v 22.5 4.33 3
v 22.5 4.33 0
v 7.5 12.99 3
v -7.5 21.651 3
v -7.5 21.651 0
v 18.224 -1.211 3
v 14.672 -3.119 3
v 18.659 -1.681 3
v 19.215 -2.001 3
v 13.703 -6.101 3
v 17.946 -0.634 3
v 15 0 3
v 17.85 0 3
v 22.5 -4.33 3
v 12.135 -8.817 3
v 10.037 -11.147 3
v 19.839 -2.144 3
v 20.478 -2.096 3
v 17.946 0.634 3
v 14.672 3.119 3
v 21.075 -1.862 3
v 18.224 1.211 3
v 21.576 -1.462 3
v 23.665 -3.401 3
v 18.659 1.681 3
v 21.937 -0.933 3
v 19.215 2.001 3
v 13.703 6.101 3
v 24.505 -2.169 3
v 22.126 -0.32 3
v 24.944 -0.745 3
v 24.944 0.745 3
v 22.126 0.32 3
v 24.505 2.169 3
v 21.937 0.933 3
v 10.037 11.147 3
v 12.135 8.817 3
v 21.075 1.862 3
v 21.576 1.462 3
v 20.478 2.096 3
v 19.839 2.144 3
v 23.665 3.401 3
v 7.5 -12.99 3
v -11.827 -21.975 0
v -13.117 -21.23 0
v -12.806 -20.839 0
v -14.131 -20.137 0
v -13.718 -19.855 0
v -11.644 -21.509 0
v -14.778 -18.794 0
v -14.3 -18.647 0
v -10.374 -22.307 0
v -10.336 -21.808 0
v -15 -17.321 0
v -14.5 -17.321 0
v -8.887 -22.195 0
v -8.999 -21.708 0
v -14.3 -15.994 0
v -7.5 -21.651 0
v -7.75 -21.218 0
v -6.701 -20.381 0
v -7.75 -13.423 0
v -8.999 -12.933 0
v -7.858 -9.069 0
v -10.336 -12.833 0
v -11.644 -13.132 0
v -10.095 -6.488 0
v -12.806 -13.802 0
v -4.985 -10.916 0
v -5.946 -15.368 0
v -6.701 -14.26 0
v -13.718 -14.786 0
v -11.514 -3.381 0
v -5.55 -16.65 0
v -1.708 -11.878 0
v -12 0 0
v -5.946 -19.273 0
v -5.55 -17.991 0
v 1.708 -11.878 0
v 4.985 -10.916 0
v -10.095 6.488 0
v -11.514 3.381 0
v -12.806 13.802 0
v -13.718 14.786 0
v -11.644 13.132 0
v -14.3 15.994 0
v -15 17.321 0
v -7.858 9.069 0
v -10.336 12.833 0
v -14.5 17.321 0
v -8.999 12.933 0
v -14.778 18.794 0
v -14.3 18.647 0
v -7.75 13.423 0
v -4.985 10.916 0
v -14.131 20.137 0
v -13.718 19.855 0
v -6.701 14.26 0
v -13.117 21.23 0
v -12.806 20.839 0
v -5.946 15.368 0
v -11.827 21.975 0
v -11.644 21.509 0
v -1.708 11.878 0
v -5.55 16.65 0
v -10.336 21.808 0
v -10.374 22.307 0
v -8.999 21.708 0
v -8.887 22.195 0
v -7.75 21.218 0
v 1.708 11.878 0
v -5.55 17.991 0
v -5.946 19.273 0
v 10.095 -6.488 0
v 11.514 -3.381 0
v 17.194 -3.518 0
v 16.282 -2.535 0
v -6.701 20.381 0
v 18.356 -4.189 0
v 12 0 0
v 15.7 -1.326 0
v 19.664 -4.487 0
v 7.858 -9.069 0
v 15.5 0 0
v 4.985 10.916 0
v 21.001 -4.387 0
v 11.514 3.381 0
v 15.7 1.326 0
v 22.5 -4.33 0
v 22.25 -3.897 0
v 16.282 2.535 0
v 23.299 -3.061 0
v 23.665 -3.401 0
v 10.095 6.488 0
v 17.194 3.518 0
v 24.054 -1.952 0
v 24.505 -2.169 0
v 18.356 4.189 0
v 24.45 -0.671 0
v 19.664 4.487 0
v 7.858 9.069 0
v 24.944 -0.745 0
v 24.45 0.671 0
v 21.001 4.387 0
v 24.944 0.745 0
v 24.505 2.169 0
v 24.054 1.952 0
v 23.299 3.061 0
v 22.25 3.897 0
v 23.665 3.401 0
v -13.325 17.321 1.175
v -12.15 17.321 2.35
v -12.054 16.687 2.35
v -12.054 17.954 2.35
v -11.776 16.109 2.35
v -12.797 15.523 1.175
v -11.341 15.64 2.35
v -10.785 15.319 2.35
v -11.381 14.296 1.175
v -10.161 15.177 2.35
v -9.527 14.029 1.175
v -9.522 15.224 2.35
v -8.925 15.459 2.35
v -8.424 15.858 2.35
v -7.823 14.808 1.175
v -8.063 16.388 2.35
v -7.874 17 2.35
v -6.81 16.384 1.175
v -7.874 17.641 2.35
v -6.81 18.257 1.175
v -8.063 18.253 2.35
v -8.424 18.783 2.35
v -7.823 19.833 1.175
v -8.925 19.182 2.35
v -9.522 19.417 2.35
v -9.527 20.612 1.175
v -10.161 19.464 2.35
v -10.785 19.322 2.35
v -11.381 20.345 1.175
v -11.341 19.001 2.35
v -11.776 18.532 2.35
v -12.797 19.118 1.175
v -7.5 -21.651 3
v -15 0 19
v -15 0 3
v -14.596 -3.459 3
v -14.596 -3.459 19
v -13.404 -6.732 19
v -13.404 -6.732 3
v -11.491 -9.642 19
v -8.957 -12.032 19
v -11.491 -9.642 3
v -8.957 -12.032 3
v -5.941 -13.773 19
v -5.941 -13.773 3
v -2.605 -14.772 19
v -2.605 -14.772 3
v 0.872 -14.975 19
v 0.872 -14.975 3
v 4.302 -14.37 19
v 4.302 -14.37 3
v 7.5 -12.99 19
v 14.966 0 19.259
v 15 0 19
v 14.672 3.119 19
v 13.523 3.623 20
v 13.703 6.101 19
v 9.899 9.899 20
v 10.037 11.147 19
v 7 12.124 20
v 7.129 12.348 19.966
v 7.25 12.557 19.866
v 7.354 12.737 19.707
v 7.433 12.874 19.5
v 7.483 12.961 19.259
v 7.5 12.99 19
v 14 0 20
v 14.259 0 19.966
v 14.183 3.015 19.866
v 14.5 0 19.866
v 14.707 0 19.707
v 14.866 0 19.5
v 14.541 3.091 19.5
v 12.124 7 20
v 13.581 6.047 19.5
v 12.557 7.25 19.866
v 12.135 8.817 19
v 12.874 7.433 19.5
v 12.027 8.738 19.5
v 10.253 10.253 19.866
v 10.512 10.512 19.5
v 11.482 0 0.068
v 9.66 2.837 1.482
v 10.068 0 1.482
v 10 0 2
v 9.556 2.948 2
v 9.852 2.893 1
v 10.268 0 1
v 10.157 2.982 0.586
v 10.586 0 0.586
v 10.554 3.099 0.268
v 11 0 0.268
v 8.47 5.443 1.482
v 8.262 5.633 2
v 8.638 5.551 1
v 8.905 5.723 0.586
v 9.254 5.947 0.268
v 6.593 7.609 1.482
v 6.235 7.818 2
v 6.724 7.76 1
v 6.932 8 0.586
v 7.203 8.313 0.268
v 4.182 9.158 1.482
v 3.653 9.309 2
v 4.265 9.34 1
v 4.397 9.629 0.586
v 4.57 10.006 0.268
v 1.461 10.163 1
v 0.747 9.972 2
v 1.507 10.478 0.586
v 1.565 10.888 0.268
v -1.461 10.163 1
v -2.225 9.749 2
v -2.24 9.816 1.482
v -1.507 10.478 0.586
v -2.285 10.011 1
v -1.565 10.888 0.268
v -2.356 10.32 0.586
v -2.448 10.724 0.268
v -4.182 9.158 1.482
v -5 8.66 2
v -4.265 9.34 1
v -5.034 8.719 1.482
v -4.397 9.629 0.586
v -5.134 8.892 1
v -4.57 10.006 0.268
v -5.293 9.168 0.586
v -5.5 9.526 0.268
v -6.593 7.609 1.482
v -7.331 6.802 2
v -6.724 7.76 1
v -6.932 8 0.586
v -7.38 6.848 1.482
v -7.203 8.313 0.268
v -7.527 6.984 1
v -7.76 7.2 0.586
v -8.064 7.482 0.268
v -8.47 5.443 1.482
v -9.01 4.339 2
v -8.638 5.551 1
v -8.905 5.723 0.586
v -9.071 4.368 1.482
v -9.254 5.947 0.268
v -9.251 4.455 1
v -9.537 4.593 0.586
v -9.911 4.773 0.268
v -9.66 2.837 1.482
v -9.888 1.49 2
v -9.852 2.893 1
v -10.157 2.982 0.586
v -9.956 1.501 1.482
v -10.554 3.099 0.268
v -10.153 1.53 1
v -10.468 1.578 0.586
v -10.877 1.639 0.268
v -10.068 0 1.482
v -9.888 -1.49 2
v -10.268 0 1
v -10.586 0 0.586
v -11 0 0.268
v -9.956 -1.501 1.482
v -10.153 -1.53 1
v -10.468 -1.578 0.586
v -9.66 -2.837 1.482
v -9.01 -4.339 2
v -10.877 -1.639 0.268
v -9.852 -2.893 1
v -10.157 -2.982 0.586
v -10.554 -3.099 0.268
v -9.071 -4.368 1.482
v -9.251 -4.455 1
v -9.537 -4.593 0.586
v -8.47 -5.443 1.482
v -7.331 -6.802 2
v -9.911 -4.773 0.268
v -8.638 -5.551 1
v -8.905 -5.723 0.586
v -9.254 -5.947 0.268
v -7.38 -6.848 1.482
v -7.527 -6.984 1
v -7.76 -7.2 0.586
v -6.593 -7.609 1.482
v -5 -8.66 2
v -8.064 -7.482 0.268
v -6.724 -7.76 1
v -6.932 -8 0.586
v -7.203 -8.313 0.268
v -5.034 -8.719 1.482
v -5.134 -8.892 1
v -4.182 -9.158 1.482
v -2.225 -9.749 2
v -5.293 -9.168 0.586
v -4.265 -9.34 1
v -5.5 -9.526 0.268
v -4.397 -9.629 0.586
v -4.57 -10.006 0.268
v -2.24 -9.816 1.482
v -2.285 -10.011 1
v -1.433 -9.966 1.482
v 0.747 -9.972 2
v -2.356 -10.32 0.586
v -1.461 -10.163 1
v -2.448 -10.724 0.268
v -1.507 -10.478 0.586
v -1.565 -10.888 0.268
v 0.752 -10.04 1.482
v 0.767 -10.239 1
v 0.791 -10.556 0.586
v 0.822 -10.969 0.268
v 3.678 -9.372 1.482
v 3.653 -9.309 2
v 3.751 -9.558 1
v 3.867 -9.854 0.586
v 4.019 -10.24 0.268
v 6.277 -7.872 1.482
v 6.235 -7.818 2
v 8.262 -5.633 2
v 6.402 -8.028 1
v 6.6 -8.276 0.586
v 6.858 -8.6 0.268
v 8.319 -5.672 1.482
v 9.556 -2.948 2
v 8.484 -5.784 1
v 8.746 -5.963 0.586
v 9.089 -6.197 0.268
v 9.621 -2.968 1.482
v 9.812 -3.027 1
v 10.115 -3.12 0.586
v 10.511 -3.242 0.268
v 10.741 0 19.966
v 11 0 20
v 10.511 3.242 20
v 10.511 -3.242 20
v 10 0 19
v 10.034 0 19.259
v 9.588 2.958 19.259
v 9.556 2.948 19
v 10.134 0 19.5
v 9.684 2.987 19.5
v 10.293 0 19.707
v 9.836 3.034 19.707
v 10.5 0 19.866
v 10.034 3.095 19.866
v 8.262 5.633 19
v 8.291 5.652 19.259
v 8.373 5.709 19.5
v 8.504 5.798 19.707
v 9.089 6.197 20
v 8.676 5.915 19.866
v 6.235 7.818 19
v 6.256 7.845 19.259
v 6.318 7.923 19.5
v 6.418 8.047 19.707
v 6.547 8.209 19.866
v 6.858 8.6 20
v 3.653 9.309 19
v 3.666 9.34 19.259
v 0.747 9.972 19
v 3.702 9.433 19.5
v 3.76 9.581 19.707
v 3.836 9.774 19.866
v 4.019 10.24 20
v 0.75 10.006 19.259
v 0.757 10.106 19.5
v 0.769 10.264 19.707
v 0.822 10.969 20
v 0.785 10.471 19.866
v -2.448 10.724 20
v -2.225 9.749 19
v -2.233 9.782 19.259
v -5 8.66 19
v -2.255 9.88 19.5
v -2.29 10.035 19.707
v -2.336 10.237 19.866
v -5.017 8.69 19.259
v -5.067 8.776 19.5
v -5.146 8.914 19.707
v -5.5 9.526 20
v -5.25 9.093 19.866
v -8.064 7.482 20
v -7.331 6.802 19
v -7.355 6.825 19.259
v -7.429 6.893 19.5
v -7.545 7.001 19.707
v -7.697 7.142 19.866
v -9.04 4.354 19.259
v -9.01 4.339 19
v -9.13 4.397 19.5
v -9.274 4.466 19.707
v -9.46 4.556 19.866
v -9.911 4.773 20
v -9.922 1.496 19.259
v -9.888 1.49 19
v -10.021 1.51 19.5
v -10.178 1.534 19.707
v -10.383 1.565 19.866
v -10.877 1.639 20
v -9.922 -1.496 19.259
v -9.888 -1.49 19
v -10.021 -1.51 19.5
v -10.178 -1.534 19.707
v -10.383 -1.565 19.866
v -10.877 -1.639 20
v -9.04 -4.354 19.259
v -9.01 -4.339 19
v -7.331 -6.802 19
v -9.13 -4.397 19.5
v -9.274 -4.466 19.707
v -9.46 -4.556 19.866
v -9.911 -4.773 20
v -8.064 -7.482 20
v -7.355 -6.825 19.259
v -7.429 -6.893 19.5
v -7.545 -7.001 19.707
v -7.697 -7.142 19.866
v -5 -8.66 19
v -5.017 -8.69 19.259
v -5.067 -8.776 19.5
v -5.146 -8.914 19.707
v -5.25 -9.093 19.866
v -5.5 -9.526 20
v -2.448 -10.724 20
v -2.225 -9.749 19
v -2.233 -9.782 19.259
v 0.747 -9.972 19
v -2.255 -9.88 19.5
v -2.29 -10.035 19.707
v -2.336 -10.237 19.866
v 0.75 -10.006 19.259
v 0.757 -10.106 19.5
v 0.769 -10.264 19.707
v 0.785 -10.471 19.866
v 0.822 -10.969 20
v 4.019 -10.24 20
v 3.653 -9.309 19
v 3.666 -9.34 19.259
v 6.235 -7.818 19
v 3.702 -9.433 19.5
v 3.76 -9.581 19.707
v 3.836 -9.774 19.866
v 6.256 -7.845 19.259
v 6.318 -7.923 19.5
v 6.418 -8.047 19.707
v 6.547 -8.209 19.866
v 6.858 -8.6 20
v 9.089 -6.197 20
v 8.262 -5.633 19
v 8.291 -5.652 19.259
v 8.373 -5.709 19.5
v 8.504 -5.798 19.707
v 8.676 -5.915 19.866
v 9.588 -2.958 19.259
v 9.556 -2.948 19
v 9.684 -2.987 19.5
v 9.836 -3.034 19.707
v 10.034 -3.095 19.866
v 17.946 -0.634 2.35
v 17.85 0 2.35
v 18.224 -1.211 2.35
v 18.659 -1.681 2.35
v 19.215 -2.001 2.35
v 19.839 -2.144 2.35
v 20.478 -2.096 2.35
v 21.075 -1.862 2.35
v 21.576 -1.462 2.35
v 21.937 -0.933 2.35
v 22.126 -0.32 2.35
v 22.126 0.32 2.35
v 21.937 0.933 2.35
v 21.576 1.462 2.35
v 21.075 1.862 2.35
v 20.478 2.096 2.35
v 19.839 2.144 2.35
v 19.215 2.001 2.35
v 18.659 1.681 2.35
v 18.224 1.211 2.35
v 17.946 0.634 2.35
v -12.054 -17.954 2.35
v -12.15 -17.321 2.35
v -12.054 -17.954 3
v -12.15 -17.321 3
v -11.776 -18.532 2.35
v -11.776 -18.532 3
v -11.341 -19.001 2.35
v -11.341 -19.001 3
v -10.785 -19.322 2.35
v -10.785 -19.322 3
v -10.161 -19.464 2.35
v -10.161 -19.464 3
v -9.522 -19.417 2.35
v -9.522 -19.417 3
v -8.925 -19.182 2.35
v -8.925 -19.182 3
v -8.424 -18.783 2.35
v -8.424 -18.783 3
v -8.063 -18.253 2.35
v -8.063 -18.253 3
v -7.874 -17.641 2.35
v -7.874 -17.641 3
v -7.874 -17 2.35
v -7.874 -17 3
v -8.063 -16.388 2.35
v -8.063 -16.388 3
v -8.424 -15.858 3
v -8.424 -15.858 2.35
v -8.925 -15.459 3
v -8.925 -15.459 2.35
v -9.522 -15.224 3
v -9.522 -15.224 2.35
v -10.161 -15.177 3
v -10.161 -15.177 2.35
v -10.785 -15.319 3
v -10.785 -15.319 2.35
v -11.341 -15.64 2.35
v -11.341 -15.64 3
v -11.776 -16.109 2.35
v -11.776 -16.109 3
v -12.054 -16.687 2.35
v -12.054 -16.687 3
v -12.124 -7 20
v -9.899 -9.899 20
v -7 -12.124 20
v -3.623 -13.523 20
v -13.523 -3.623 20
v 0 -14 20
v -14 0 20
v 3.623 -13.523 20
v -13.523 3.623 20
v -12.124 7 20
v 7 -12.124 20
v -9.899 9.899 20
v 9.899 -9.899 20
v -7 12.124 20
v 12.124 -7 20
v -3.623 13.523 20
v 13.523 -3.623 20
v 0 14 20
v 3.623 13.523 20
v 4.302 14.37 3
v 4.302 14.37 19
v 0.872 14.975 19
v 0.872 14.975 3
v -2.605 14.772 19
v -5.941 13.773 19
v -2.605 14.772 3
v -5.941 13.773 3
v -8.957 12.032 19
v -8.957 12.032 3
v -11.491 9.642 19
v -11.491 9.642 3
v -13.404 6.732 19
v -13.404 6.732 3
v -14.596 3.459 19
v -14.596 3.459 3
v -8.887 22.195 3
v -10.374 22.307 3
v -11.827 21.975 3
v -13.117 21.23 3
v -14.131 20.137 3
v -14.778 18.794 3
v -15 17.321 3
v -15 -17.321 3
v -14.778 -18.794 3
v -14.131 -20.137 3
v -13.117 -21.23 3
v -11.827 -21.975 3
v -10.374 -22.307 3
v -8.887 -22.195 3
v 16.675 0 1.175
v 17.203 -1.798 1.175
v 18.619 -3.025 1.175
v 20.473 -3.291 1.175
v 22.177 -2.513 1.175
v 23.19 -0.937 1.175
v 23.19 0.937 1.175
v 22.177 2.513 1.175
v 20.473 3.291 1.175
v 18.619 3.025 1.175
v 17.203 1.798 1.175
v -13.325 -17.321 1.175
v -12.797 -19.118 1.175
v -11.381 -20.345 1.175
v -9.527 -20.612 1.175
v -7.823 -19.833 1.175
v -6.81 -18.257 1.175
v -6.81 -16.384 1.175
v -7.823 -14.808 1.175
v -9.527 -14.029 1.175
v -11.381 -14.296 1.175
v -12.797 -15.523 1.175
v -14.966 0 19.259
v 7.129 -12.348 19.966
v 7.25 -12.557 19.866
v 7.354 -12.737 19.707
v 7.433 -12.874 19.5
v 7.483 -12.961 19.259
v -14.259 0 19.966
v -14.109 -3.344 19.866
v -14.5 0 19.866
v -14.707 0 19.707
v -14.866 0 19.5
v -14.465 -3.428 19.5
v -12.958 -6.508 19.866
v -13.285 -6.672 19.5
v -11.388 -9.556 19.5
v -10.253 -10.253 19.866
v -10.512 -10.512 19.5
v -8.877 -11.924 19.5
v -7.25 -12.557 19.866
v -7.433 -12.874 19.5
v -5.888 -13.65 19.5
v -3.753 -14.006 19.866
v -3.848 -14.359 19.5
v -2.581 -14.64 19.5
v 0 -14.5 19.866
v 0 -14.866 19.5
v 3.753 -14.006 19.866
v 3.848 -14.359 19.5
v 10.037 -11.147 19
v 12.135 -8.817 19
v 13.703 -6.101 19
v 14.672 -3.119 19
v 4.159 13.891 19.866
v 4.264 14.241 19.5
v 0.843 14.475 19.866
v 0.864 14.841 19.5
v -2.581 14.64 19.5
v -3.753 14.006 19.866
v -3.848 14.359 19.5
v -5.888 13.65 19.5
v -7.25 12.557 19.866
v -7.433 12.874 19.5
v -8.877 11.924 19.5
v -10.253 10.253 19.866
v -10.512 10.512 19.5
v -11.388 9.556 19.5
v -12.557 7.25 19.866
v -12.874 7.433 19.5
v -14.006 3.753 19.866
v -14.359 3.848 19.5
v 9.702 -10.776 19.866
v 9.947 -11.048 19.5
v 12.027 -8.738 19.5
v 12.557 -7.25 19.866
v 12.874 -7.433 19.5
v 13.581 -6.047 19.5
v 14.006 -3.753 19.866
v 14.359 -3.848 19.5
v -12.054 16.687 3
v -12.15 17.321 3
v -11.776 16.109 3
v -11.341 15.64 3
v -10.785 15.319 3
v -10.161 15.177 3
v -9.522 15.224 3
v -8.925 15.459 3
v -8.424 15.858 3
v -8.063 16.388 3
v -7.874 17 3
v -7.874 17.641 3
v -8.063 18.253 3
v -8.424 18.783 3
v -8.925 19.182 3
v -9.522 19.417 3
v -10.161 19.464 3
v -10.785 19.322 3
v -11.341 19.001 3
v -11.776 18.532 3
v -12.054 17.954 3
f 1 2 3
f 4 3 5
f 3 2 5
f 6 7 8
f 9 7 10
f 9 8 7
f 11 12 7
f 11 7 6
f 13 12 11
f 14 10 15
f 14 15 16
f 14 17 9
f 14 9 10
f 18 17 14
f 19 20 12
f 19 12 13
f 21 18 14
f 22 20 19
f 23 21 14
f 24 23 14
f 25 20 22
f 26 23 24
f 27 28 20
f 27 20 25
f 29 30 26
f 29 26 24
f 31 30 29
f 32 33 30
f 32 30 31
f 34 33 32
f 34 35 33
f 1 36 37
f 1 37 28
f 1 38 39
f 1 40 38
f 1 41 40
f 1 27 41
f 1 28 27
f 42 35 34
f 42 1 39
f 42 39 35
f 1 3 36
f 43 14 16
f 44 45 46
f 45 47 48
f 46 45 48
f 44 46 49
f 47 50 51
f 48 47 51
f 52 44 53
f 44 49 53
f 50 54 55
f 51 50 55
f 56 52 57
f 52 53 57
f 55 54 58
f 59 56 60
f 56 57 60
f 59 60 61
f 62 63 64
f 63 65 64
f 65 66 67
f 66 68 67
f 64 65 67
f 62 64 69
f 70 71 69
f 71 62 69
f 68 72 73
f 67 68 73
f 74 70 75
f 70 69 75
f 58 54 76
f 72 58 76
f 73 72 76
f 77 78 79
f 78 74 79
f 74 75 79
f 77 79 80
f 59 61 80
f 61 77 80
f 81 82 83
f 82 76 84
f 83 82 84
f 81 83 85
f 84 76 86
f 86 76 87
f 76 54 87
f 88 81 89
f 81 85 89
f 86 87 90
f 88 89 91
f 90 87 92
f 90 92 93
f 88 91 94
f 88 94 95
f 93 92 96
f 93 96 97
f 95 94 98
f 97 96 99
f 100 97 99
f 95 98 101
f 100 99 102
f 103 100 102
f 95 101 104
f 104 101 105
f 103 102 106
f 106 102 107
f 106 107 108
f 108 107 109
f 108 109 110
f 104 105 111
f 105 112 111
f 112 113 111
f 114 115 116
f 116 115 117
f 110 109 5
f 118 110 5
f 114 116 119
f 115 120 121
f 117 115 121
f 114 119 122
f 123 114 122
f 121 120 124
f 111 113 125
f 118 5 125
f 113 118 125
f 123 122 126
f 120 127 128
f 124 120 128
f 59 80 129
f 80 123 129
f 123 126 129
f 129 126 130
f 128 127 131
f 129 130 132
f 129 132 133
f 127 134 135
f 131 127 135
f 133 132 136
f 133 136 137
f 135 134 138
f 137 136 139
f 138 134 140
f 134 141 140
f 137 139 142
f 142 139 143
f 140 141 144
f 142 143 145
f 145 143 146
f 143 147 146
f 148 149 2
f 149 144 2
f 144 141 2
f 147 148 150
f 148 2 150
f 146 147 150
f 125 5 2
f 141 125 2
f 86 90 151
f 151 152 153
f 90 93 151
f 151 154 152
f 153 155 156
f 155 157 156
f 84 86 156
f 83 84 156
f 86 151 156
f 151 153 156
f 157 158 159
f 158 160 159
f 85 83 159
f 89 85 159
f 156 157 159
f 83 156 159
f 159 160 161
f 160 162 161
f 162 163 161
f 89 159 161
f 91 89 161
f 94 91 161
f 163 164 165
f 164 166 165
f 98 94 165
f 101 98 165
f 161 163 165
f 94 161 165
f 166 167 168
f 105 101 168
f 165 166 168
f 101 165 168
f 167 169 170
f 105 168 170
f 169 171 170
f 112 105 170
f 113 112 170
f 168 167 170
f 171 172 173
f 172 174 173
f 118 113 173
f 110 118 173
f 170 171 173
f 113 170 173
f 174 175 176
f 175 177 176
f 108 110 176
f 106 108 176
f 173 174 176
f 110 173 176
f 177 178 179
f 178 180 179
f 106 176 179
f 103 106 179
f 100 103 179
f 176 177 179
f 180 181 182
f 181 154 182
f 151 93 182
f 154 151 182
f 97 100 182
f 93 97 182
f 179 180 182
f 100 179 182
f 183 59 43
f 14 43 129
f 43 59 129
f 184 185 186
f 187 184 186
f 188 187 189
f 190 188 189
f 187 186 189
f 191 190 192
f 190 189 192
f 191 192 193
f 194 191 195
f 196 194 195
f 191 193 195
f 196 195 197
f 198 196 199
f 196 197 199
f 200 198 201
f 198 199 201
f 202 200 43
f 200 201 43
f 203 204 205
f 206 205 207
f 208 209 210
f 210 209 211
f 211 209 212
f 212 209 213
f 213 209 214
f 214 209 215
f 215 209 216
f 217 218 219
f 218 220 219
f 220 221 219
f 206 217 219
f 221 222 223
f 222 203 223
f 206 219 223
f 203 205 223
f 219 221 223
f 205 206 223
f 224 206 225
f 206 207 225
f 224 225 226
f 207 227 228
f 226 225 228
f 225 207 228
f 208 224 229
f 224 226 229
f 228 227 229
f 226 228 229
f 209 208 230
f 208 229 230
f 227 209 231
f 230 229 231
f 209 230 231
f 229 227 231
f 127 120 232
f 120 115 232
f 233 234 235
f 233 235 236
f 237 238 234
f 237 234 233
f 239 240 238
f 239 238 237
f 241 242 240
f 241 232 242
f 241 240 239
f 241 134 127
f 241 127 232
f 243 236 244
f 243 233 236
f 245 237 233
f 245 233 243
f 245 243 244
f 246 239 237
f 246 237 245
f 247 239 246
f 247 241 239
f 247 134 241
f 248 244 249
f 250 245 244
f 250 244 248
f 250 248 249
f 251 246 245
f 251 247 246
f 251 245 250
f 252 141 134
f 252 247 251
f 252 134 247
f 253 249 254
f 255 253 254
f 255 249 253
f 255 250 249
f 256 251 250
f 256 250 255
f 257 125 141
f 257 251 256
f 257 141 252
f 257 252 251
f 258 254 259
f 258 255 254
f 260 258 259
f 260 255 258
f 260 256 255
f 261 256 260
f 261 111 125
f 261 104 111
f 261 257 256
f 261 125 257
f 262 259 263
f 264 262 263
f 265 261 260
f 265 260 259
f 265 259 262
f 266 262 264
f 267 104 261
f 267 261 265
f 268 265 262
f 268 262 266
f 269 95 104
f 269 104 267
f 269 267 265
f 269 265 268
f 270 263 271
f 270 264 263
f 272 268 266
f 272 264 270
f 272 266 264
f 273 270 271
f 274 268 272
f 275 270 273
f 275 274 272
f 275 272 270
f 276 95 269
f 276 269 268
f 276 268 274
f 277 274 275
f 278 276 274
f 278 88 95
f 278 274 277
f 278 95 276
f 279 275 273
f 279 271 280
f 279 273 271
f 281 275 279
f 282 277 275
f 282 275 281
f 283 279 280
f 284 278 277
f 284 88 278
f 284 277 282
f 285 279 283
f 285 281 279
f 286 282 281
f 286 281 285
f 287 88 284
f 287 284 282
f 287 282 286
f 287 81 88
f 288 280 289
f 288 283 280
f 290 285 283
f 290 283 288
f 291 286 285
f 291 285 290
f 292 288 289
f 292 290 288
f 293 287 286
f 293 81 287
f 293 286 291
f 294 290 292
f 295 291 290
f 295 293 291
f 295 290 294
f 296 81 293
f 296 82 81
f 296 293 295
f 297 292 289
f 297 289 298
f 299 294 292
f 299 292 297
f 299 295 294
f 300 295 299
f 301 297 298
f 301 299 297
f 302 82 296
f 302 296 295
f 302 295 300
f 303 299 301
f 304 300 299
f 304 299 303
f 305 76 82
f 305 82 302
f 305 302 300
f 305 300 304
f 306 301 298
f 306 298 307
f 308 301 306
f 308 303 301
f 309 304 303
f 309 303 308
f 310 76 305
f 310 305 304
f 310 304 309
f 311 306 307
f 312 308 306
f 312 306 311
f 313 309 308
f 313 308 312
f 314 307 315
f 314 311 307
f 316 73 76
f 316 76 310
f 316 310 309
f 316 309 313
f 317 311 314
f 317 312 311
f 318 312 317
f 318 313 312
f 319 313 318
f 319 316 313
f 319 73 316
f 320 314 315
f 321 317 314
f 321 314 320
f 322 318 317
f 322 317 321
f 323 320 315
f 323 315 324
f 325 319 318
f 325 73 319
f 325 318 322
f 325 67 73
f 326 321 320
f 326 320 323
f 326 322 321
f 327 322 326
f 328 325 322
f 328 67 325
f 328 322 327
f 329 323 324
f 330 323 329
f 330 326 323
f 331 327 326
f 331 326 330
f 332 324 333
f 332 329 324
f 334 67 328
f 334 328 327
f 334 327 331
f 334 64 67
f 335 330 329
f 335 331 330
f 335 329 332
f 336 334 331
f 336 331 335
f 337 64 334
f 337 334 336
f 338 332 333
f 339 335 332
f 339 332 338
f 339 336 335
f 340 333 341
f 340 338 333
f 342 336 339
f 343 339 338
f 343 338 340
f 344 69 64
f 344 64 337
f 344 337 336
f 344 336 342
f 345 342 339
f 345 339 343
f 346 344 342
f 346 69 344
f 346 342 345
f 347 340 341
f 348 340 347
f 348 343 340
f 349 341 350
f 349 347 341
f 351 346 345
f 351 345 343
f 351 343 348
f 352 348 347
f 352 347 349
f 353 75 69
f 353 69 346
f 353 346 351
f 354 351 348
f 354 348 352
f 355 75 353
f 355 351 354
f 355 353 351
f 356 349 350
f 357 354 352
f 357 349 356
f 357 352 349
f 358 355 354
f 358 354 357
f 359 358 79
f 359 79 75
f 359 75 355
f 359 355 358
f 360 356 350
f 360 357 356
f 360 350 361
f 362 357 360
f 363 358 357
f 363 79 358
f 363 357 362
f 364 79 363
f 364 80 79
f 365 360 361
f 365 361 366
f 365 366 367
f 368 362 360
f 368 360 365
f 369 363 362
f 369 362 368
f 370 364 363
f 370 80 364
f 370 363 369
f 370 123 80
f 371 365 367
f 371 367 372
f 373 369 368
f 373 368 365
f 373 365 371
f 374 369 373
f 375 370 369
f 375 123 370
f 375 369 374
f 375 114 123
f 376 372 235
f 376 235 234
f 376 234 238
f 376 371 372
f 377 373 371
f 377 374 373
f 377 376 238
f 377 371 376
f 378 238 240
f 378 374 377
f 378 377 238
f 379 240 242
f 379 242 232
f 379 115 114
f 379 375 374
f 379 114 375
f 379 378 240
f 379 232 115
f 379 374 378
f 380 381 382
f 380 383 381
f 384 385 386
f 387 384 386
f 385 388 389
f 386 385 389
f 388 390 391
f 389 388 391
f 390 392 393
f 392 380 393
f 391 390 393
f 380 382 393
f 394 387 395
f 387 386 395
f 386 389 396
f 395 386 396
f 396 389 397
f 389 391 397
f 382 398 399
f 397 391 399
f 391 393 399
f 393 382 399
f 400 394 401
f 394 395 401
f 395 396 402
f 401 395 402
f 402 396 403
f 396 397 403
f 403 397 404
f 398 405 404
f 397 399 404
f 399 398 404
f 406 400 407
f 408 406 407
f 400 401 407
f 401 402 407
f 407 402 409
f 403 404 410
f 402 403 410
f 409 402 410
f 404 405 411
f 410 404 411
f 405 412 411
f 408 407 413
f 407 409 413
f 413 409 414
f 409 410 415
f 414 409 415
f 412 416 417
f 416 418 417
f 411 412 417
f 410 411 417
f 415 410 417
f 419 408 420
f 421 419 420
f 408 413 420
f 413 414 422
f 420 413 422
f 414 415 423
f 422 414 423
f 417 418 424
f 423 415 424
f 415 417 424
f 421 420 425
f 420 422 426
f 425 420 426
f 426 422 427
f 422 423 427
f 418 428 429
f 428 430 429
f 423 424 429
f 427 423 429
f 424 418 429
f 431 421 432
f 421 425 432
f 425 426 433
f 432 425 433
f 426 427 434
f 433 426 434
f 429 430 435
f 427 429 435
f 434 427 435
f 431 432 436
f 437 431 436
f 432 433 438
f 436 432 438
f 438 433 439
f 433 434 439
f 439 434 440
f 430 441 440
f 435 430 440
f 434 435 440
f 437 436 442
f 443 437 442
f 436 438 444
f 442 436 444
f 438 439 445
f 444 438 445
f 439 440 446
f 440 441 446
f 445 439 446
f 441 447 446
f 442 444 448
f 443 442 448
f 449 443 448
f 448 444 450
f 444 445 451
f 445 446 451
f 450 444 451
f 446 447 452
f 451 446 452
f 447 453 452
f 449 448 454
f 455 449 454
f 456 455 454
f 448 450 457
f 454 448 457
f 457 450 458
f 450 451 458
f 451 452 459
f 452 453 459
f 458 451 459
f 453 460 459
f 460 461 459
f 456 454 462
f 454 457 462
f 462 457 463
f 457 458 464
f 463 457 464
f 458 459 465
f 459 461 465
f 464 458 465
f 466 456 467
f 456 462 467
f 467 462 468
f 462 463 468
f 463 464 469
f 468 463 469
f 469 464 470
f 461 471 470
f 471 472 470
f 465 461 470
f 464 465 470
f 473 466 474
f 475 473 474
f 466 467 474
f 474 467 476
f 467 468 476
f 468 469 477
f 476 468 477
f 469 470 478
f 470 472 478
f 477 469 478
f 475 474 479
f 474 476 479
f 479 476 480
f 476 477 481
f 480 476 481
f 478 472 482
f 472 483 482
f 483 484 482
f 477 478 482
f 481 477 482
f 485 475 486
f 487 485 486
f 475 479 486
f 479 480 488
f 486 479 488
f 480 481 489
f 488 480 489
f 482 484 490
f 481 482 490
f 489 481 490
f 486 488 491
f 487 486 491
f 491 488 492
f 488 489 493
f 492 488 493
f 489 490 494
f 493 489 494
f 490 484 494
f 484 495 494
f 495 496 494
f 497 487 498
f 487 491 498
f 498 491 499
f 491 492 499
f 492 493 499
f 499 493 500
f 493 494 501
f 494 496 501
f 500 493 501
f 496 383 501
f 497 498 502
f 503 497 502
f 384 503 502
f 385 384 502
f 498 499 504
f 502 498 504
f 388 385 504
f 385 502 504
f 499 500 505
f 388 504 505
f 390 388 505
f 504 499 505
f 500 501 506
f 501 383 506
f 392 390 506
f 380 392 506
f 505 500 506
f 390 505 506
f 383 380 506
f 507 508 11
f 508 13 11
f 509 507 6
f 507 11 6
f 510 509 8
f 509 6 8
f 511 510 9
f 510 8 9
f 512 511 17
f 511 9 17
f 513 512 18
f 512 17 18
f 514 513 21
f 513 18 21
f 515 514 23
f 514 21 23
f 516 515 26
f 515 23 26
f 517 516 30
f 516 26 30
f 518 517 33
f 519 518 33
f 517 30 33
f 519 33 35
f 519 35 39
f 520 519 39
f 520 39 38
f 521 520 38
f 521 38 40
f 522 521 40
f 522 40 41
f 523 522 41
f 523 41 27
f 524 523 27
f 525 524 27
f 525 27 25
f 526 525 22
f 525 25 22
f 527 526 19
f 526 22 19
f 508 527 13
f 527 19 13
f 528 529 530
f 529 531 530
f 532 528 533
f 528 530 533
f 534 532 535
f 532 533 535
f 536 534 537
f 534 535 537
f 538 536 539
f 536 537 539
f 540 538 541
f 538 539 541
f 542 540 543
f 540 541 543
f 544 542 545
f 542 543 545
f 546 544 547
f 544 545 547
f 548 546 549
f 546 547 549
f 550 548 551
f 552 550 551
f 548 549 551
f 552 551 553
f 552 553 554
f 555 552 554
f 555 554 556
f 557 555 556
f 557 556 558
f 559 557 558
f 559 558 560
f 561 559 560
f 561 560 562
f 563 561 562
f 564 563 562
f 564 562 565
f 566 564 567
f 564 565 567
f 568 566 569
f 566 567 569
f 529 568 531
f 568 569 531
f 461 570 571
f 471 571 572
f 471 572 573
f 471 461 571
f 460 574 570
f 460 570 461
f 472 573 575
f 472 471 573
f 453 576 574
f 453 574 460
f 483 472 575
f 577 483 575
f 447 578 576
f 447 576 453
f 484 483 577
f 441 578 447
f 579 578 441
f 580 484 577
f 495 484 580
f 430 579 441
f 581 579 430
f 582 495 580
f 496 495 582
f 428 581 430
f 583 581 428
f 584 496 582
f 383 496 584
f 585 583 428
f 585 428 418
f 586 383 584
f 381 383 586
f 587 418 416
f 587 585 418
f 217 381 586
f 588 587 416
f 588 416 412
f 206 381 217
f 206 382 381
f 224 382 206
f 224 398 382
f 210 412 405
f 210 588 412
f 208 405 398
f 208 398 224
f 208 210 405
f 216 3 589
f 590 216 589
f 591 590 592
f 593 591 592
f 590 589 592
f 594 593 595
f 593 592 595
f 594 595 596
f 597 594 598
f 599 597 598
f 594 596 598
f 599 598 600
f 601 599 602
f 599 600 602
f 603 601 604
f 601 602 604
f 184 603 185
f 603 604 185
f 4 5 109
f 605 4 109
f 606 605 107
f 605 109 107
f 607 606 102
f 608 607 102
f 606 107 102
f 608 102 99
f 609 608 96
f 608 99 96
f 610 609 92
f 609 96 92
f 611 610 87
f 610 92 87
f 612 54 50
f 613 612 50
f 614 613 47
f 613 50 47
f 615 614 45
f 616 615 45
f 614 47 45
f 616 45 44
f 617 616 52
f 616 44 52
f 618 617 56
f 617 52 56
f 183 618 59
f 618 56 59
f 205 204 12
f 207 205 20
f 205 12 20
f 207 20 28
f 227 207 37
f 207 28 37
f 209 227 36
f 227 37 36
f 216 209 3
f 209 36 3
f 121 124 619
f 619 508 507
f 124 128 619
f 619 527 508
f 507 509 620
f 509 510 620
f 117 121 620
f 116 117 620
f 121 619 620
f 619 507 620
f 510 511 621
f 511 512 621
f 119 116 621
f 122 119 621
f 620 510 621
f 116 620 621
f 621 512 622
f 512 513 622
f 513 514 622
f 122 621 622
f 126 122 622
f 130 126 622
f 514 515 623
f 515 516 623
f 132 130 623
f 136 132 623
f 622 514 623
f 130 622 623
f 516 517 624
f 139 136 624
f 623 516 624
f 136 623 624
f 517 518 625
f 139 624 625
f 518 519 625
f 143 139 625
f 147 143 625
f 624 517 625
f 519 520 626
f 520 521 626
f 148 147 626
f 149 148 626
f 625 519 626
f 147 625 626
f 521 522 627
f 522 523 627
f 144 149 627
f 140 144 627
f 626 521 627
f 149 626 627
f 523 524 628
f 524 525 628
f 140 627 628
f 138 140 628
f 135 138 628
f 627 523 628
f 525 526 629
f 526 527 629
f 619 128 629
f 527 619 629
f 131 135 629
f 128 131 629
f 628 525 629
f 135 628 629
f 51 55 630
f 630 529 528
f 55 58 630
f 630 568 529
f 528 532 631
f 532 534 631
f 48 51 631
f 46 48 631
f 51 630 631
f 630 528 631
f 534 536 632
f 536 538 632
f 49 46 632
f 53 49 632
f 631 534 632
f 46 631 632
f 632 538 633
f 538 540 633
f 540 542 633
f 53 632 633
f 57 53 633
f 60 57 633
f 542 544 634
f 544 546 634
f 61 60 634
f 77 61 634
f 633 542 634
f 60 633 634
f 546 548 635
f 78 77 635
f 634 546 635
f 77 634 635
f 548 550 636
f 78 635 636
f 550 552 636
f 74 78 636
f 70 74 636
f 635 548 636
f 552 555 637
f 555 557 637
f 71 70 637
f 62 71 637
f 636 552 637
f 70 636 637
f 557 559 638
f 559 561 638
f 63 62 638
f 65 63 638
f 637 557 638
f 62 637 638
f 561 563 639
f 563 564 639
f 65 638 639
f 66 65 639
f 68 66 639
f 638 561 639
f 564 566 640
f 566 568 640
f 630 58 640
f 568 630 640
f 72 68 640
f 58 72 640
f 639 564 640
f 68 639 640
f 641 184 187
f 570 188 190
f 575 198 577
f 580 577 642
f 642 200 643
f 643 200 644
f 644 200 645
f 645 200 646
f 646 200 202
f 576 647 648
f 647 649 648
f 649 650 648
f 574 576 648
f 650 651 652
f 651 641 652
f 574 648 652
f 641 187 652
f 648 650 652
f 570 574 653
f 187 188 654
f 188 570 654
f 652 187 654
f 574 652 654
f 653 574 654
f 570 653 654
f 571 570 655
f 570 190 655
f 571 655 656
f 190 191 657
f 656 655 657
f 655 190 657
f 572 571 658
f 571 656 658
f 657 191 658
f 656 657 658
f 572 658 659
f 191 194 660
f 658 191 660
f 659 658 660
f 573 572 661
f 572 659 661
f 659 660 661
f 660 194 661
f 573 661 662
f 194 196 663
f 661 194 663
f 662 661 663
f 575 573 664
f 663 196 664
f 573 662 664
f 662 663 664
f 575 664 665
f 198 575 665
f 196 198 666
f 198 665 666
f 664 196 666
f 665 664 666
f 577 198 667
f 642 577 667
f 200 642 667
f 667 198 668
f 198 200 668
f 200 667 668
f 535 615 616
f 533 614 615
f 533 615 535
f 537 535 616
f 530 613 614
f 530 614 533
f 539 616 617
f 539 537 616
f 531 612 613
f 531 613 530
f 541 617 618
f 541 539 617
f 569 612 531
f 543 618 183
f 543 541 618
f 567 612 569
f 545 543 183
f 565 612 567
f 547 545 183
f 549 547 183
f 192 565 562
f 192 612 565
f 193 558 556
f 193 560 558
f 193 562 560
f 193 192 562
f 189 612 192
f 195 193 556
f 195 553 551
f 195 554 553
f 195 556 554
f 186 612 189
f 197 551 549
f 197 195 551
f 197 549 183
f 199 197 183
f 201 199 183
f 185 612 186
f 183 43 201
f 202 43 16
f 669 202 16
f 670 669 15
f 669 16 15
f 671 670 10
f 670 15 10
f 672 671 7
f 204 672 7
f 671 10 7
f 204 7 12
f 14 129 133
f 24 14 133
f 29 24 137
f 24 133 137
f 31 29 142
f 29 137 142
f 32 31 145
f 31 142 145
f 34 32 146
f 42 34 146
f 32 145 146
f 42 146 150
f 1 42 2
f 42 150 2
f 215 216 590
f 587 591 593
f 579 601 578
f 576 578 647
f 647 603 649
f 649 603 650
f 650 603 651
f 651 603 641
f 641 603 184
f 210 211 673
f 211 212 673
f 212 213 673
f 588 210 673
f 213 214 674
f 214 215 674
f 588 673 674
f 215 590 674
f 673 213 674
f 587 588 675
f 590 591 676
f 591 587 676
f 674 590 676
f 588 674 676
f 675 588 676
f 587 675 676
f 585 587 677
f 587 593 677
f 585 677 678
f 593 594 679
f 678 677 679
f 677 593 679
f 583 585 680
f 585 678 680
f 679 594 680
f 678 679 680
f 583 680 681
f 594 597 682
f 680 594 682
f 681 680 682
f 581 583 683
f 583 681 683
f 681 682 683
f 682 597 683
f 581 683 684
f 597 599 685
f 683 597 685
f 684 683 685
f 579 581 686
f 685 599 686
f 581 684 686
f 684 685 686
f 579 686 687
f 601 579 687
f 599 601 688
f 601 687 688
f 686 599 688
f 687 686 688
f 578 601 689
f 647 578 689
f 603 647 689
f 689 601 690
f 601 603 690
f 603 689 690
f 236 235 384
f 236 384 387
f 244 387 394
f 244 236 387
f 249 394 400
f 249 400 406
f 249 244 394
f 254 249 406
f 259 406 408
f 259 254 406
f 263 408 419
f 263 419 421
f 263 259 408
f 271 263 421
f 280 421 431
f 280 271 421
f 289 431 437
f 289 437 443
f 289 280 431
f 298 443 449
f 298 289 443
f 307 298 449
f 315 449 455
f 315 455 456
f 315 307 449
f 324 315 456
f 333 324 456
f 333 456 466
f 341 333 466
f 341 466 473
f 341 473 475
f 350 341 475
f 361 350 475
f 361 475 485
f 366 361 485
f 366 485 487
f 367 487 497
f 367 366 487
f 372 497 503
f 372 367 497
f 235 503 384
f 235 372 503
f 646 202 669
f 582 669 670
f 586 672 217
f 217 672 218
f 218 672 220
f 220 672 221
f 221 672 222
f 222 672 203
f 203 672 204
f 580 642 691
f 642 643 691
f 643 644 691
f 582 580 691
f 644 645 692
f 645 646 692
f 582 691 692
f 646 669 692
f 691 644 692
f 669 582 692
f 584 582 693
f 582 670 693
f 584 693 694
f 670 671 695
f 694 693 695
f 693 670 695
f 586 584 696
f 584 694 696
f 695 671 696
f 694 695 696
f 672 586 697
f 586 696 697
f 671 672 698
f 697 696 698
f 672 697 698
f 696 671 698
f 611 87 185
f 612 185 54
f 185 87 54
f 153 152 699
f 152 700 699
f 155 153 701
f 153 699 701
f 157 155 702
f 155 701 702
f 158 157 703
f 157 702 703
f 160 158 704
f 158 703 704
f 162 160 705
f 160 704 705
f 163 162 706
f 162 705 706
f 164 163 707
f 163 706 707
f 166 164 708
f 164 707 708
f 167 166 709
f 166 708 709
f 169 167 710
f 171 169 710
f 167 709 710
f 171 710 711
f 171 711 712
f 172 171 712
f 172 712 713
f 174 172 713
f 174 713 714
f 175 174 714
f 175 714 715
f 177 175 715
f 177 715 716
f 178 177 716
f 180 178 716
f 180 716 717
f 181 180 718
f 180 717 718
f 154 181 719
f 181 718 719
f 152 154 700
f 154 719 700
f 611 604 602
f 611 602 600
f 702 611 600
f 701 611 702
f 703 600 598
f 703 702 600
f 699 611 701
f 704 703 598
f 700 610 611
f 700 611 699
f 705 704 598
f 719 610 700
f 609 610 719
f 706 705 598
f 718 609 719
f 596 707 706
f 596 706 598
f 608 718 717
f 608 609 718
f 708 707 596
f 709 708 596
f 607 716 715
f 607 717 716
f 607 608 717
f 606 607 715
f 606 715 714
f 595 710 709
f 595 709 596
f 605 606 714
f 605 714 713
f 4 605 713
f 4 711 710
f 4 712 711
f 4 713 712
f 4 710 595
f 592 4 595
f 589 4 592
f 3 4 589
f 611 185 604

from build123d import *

# Parameters (mm, degrees)
F0_R           = 10
F1_DEPTH       = 20
F2_DEPTH       = 3
F3_D           = 4.3
F3_CSINK_D     = 9
F3_CSINK_ANGLE = 90
F4_R           = 2
F5_R           = 1


with BuildPart() as f1:
    # F0 (on Top) → F1 (new body)
    with BuildSketch(Plane.XY):
        with BuildLine():
            ThreePointArc((15, 0), (12.990381, 7.5), (7.5, 12.990381))
            ThreePointArc((7.5, 12.990381), (-7.5, 12.990381), (-15, 0))
            ThreePointArc((-15, 0), (-7.5, -12.990381), (7.5, -12.990381))
            ThreePointArc((7.5, -12.990381), (12.990381, -7.5), (15, 0))
        make_face()
        Circle(F0_R, mode=Mode.SUBTRACT)
    extrude(amount=F1_DEPTH)

    # F0 (on Top) → F2 (join)
    with BuildSketch(Plane.XY):
        with BuildLine():
            ThreePointArc((-15, 0), (-7.5, 12.990381), (7.5, 12.990381))
            Line((7.5, 12.990381), (-7.5, 21.650635))
            ThreePointArc((-7.5, 21.650635), (-12.5, 21.650635), (-15, 17.320508))
            Line((-15, 17.320508), (-15, 0))
        make_face()
        with BuildLine():
            ThreePointArc((22.5, -4.330127), (25, 0), (22.5, 4.330127))
            Line((22.5, 4.330127), (7.5, 12.990381))
            ThreePointArc((7.5, 12.990381), (12.990381, 7.5), (15, 0))
            ThreePointArc((15, 0), (12.990381, -7.5), (7.5, -12.990381))
            Line((7.5, -12.990381), (22.5, -4.330127))
        make_face()
        with BuildLine():
            ThreePointArc((7.5, -12.990381), (-7.5, -12.990381), (-15, 0))
            Line((-15, 0), (-15, -17.320508))
            ThreePointArc((-15, -17.320508), (-12.5, -21.650635), (-7.5, -21.650635))
            Line((-7.5, -21.650635), (7.5, -12.990381))
        make_face()
    extrude(amount=F2_DEPTH)

    # F3 (through all)
    with Locations(Plane(origin=(0, 0, 0), x_dir=(1, 0, 0), z_dir=(0, 0, -1))):
        with Locations((20, 0), (-10, -17.320508), (-10, 17.320508)):
            CounterSinkHole(F3_D / 2, F3_CSINK_D / 2, counter_sink_angle=F3_CSINK_ANGLE)

    # F4
    f4_edges = [f1.edges().sort_by_distance(p)[0] for p in [
        (-10, 0, 0),
    ]]
    fillet(f4_edges, radius=F4_R)

    # F5
    f5_edges = [f1.edges().sort_by_distance(p)[0] for p in [
        (-15, 0, 20),
        (-10, 0, 20),
    ]]
    fillet(f5_edges, radius=F5_R)


solid = f1.part
